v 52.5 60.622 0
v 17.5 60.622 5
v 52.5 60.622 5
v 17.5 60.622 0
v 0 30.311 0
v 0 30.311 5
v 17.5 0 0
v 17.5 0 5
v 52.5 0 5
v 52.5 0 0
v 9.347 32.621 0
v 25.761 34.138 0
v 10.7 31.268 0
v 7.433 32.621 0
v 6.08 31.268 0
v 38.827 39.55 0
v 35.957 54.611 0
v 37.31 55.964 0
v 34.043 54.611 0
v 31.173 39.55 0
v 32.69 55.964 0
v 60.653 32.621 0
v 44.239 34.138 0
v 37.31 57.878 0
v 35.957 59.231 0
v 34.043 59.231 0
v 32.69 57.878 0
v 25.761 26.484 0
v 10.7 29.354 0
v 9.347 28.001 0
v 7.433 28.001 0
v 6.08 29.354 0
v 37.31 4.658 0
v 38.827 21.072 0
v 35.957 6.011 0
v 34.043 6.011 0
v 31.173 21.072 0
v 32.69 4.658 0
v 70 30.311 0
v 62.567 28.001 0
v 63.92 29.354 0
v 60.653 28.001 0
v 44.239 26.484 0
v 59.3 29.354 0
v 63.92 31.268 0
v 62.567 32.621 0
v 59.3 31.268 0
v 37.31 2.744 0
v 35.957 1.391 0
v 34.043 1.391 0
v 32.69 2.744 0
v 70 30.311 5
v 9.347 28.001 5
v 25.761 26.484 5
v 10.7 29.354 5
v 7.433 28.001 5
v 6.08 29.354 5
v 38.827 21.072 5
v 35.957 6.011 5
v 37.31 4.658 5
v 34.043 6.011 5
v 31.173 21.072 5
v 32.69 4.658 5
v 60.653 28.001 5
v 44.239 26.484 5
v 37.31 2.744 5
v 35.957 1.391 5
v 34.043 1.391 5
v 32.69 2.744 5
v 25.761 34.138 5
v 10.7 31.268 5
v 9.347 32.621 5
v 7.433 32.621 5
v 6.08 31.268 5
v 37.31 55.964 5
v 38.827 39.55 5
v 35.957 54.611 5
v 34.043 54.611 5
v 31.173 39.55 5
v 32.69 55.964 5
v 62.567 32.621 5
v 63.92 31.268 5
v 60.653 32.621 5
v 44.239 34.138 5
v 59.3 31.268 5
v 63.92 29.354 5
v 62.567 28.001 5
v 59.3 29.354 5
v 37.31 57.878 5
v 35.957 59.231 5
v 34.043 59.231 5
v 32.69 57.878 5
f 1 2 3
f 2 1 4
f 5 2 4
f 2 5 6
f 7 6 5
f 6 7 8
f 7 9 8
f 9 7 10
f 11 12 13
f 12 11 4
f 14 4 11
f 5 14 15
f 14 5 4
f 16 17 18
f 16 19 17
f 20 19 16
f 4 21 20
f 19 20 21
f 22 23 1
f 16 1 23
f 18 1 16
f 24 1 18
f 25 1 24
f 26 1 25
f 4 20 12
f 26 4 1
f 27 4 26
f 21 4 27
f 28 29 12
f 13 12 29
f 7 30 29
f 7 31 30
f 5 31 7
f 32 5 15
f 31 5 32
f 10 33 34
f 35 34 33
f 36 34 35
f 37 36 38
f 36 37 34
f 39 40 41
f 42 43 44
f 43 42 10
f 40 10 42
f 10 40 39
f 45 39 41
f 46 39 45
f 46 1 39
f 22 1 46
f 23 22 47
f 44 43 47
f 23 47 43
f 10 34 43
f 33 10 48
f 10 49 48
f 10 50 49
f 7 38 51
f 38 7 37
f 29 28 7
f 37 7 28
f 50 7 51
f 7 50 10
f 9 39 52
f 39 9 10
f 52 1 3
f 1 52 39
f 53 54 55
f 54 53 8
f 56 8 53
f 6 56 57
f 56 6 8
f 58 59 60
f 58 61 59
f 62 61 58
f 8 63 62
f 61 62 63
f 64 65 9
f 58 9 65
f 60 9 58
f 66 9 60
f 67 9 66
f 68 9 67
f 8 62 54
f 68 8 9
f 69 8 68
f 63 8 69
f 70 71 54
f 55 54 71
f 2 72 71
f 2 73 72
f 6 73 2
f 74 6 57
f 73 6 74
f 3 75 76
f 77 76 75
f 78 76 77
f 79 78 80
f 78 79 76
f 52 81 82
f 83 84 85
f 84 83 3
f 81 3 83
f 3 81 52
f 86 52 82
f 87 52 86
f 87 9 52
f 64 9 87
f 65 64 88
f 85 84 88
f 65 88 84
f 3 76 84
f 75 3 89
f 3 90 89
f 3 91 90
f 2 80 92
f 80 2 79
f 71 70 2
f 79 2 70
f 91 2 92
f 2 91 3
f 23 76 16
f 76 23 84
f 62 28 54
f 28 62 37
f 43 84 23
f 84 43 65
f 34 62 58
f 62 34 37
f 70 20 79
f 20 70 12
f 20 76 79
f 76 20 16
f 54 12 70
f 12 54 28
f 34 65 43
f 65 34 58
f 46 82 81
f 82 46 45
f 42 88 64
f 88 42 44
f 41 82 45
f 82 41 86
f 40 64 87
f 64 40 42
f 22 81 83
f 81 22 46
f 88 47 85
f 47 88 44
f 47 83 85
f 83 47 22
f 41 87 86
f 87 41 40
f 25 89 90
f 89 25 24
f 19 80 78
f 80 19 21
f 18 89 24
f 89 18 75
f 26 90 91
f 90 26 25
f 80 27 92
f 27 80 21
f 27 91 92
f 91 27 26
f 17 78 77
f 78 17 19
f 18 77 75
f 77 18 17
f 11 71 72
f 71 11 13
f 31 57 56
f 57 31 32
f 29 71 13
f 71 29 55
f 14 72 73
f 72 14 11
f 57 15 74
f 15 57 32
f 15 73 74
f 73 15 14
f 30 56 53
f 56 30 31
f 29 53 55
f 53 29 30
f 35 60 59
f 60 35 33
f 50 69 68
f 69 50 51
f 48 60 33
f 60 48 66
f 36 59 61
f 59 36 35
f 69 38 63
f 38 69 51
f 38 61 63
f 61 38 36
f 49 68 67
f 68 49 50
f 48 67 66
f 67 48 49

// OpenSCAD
$fn = 32;

// ----------------------------------------------------------------------
// Polygon plate: 6-gon R35, 4 bolt windows
// ----------------------------------------------------------------------

// --- parameters (mm) ---
sides = 6;                // number of polygon sides
plate_r = 35;             // circumscribed radius of the polygon
bore_r = 10;              // centre bore radius
bolts = 4;                // number of bolt windows
ring_r = 26.61;           // bolt-circle radius
bolt_r = 2.5;             // bolt window radius
plate_t = 5;              // plate thickness, Z (extrusion height)

plate_d = 2 * plate_r;  // circumscribed diameter
bore_d = 2 * bore_r;  // centre bore diameter
bolt_d = 2 * bolt_r;  // bolt window diameter
ring_d = 2 * ring_r;  // bolt-circle diameter

profile = [[70, 30.311], [52.5, 60.622], [17.5, 60.622], [0, 30.311], [17.5, 0], [52.5, 0]];  // primary outline, 6 points, counter clockwise
void_1 = [[44.239, 34.138], [38.827, 39.55], [31.173, 39.55], [25.761, 34.138], [25.761, 26.484], [31.173, 21.072], [38.827, 21.072], [44.239, 26.484]];  // centre bore, 8 points
void_2 = [[63.92, 31.268], [62.567, 32.621], [60.653, 32.621], [59.3, 31.268], [59.3, 29.354], [60.653, 28.001], [62.567, 28.001], [63.92, 29.354]];  // bolt window 1, 8 points
void_3 = [[37.31, 57.878], [35.957, 59.231], [34.043, 59.231], [32.69, 57.878], [32.69, 55.964], [34.043, 54.611], [35.957, 54.611], [37.31, 55.964]];  // bolt window 2, 8 points
void_4 = [[10.7, 31.268], [9.347, 32.621], [7.433, 32.621], [6.08, 31.268], [6.08, 29.354], [7.433, 28.001], [9.347, 28.001], [10.7, 29.354]];  // bolt window 3, 8 points
void_5 = [[37.31, 4.658], [35.957, 6.011], [34.043, 6.011], [32.69, 4.658], [32.69, 2.744], [34.043, 1.391], [35.957, 1.391], [37.31, 2.744]];  // bolt window 4, 8 points

// --- the one profile operation ---
difference() {
  linear_extrude(height = plate_t) polygon(points = profile);
  translate([0, 0, -1])
    linear_extrude(height = plate_t + 2) polygon(points = void_1);
  translate([0, 0, -1])
    linear_extrude(height = plate_t + 2) polygon(points = void_2);
  translate([0, 0, -1])
    linear_extrude(height = plate_t + 2) polygon(points = void_3);
  translate([0, 0, -1])
    linear_extrude(height = plate_t + 2) polygon(points = void_4);
  translate([0, 0, -1])
    linear_extrude(height = plate_t + 2) polygon(points = void_5);
}
